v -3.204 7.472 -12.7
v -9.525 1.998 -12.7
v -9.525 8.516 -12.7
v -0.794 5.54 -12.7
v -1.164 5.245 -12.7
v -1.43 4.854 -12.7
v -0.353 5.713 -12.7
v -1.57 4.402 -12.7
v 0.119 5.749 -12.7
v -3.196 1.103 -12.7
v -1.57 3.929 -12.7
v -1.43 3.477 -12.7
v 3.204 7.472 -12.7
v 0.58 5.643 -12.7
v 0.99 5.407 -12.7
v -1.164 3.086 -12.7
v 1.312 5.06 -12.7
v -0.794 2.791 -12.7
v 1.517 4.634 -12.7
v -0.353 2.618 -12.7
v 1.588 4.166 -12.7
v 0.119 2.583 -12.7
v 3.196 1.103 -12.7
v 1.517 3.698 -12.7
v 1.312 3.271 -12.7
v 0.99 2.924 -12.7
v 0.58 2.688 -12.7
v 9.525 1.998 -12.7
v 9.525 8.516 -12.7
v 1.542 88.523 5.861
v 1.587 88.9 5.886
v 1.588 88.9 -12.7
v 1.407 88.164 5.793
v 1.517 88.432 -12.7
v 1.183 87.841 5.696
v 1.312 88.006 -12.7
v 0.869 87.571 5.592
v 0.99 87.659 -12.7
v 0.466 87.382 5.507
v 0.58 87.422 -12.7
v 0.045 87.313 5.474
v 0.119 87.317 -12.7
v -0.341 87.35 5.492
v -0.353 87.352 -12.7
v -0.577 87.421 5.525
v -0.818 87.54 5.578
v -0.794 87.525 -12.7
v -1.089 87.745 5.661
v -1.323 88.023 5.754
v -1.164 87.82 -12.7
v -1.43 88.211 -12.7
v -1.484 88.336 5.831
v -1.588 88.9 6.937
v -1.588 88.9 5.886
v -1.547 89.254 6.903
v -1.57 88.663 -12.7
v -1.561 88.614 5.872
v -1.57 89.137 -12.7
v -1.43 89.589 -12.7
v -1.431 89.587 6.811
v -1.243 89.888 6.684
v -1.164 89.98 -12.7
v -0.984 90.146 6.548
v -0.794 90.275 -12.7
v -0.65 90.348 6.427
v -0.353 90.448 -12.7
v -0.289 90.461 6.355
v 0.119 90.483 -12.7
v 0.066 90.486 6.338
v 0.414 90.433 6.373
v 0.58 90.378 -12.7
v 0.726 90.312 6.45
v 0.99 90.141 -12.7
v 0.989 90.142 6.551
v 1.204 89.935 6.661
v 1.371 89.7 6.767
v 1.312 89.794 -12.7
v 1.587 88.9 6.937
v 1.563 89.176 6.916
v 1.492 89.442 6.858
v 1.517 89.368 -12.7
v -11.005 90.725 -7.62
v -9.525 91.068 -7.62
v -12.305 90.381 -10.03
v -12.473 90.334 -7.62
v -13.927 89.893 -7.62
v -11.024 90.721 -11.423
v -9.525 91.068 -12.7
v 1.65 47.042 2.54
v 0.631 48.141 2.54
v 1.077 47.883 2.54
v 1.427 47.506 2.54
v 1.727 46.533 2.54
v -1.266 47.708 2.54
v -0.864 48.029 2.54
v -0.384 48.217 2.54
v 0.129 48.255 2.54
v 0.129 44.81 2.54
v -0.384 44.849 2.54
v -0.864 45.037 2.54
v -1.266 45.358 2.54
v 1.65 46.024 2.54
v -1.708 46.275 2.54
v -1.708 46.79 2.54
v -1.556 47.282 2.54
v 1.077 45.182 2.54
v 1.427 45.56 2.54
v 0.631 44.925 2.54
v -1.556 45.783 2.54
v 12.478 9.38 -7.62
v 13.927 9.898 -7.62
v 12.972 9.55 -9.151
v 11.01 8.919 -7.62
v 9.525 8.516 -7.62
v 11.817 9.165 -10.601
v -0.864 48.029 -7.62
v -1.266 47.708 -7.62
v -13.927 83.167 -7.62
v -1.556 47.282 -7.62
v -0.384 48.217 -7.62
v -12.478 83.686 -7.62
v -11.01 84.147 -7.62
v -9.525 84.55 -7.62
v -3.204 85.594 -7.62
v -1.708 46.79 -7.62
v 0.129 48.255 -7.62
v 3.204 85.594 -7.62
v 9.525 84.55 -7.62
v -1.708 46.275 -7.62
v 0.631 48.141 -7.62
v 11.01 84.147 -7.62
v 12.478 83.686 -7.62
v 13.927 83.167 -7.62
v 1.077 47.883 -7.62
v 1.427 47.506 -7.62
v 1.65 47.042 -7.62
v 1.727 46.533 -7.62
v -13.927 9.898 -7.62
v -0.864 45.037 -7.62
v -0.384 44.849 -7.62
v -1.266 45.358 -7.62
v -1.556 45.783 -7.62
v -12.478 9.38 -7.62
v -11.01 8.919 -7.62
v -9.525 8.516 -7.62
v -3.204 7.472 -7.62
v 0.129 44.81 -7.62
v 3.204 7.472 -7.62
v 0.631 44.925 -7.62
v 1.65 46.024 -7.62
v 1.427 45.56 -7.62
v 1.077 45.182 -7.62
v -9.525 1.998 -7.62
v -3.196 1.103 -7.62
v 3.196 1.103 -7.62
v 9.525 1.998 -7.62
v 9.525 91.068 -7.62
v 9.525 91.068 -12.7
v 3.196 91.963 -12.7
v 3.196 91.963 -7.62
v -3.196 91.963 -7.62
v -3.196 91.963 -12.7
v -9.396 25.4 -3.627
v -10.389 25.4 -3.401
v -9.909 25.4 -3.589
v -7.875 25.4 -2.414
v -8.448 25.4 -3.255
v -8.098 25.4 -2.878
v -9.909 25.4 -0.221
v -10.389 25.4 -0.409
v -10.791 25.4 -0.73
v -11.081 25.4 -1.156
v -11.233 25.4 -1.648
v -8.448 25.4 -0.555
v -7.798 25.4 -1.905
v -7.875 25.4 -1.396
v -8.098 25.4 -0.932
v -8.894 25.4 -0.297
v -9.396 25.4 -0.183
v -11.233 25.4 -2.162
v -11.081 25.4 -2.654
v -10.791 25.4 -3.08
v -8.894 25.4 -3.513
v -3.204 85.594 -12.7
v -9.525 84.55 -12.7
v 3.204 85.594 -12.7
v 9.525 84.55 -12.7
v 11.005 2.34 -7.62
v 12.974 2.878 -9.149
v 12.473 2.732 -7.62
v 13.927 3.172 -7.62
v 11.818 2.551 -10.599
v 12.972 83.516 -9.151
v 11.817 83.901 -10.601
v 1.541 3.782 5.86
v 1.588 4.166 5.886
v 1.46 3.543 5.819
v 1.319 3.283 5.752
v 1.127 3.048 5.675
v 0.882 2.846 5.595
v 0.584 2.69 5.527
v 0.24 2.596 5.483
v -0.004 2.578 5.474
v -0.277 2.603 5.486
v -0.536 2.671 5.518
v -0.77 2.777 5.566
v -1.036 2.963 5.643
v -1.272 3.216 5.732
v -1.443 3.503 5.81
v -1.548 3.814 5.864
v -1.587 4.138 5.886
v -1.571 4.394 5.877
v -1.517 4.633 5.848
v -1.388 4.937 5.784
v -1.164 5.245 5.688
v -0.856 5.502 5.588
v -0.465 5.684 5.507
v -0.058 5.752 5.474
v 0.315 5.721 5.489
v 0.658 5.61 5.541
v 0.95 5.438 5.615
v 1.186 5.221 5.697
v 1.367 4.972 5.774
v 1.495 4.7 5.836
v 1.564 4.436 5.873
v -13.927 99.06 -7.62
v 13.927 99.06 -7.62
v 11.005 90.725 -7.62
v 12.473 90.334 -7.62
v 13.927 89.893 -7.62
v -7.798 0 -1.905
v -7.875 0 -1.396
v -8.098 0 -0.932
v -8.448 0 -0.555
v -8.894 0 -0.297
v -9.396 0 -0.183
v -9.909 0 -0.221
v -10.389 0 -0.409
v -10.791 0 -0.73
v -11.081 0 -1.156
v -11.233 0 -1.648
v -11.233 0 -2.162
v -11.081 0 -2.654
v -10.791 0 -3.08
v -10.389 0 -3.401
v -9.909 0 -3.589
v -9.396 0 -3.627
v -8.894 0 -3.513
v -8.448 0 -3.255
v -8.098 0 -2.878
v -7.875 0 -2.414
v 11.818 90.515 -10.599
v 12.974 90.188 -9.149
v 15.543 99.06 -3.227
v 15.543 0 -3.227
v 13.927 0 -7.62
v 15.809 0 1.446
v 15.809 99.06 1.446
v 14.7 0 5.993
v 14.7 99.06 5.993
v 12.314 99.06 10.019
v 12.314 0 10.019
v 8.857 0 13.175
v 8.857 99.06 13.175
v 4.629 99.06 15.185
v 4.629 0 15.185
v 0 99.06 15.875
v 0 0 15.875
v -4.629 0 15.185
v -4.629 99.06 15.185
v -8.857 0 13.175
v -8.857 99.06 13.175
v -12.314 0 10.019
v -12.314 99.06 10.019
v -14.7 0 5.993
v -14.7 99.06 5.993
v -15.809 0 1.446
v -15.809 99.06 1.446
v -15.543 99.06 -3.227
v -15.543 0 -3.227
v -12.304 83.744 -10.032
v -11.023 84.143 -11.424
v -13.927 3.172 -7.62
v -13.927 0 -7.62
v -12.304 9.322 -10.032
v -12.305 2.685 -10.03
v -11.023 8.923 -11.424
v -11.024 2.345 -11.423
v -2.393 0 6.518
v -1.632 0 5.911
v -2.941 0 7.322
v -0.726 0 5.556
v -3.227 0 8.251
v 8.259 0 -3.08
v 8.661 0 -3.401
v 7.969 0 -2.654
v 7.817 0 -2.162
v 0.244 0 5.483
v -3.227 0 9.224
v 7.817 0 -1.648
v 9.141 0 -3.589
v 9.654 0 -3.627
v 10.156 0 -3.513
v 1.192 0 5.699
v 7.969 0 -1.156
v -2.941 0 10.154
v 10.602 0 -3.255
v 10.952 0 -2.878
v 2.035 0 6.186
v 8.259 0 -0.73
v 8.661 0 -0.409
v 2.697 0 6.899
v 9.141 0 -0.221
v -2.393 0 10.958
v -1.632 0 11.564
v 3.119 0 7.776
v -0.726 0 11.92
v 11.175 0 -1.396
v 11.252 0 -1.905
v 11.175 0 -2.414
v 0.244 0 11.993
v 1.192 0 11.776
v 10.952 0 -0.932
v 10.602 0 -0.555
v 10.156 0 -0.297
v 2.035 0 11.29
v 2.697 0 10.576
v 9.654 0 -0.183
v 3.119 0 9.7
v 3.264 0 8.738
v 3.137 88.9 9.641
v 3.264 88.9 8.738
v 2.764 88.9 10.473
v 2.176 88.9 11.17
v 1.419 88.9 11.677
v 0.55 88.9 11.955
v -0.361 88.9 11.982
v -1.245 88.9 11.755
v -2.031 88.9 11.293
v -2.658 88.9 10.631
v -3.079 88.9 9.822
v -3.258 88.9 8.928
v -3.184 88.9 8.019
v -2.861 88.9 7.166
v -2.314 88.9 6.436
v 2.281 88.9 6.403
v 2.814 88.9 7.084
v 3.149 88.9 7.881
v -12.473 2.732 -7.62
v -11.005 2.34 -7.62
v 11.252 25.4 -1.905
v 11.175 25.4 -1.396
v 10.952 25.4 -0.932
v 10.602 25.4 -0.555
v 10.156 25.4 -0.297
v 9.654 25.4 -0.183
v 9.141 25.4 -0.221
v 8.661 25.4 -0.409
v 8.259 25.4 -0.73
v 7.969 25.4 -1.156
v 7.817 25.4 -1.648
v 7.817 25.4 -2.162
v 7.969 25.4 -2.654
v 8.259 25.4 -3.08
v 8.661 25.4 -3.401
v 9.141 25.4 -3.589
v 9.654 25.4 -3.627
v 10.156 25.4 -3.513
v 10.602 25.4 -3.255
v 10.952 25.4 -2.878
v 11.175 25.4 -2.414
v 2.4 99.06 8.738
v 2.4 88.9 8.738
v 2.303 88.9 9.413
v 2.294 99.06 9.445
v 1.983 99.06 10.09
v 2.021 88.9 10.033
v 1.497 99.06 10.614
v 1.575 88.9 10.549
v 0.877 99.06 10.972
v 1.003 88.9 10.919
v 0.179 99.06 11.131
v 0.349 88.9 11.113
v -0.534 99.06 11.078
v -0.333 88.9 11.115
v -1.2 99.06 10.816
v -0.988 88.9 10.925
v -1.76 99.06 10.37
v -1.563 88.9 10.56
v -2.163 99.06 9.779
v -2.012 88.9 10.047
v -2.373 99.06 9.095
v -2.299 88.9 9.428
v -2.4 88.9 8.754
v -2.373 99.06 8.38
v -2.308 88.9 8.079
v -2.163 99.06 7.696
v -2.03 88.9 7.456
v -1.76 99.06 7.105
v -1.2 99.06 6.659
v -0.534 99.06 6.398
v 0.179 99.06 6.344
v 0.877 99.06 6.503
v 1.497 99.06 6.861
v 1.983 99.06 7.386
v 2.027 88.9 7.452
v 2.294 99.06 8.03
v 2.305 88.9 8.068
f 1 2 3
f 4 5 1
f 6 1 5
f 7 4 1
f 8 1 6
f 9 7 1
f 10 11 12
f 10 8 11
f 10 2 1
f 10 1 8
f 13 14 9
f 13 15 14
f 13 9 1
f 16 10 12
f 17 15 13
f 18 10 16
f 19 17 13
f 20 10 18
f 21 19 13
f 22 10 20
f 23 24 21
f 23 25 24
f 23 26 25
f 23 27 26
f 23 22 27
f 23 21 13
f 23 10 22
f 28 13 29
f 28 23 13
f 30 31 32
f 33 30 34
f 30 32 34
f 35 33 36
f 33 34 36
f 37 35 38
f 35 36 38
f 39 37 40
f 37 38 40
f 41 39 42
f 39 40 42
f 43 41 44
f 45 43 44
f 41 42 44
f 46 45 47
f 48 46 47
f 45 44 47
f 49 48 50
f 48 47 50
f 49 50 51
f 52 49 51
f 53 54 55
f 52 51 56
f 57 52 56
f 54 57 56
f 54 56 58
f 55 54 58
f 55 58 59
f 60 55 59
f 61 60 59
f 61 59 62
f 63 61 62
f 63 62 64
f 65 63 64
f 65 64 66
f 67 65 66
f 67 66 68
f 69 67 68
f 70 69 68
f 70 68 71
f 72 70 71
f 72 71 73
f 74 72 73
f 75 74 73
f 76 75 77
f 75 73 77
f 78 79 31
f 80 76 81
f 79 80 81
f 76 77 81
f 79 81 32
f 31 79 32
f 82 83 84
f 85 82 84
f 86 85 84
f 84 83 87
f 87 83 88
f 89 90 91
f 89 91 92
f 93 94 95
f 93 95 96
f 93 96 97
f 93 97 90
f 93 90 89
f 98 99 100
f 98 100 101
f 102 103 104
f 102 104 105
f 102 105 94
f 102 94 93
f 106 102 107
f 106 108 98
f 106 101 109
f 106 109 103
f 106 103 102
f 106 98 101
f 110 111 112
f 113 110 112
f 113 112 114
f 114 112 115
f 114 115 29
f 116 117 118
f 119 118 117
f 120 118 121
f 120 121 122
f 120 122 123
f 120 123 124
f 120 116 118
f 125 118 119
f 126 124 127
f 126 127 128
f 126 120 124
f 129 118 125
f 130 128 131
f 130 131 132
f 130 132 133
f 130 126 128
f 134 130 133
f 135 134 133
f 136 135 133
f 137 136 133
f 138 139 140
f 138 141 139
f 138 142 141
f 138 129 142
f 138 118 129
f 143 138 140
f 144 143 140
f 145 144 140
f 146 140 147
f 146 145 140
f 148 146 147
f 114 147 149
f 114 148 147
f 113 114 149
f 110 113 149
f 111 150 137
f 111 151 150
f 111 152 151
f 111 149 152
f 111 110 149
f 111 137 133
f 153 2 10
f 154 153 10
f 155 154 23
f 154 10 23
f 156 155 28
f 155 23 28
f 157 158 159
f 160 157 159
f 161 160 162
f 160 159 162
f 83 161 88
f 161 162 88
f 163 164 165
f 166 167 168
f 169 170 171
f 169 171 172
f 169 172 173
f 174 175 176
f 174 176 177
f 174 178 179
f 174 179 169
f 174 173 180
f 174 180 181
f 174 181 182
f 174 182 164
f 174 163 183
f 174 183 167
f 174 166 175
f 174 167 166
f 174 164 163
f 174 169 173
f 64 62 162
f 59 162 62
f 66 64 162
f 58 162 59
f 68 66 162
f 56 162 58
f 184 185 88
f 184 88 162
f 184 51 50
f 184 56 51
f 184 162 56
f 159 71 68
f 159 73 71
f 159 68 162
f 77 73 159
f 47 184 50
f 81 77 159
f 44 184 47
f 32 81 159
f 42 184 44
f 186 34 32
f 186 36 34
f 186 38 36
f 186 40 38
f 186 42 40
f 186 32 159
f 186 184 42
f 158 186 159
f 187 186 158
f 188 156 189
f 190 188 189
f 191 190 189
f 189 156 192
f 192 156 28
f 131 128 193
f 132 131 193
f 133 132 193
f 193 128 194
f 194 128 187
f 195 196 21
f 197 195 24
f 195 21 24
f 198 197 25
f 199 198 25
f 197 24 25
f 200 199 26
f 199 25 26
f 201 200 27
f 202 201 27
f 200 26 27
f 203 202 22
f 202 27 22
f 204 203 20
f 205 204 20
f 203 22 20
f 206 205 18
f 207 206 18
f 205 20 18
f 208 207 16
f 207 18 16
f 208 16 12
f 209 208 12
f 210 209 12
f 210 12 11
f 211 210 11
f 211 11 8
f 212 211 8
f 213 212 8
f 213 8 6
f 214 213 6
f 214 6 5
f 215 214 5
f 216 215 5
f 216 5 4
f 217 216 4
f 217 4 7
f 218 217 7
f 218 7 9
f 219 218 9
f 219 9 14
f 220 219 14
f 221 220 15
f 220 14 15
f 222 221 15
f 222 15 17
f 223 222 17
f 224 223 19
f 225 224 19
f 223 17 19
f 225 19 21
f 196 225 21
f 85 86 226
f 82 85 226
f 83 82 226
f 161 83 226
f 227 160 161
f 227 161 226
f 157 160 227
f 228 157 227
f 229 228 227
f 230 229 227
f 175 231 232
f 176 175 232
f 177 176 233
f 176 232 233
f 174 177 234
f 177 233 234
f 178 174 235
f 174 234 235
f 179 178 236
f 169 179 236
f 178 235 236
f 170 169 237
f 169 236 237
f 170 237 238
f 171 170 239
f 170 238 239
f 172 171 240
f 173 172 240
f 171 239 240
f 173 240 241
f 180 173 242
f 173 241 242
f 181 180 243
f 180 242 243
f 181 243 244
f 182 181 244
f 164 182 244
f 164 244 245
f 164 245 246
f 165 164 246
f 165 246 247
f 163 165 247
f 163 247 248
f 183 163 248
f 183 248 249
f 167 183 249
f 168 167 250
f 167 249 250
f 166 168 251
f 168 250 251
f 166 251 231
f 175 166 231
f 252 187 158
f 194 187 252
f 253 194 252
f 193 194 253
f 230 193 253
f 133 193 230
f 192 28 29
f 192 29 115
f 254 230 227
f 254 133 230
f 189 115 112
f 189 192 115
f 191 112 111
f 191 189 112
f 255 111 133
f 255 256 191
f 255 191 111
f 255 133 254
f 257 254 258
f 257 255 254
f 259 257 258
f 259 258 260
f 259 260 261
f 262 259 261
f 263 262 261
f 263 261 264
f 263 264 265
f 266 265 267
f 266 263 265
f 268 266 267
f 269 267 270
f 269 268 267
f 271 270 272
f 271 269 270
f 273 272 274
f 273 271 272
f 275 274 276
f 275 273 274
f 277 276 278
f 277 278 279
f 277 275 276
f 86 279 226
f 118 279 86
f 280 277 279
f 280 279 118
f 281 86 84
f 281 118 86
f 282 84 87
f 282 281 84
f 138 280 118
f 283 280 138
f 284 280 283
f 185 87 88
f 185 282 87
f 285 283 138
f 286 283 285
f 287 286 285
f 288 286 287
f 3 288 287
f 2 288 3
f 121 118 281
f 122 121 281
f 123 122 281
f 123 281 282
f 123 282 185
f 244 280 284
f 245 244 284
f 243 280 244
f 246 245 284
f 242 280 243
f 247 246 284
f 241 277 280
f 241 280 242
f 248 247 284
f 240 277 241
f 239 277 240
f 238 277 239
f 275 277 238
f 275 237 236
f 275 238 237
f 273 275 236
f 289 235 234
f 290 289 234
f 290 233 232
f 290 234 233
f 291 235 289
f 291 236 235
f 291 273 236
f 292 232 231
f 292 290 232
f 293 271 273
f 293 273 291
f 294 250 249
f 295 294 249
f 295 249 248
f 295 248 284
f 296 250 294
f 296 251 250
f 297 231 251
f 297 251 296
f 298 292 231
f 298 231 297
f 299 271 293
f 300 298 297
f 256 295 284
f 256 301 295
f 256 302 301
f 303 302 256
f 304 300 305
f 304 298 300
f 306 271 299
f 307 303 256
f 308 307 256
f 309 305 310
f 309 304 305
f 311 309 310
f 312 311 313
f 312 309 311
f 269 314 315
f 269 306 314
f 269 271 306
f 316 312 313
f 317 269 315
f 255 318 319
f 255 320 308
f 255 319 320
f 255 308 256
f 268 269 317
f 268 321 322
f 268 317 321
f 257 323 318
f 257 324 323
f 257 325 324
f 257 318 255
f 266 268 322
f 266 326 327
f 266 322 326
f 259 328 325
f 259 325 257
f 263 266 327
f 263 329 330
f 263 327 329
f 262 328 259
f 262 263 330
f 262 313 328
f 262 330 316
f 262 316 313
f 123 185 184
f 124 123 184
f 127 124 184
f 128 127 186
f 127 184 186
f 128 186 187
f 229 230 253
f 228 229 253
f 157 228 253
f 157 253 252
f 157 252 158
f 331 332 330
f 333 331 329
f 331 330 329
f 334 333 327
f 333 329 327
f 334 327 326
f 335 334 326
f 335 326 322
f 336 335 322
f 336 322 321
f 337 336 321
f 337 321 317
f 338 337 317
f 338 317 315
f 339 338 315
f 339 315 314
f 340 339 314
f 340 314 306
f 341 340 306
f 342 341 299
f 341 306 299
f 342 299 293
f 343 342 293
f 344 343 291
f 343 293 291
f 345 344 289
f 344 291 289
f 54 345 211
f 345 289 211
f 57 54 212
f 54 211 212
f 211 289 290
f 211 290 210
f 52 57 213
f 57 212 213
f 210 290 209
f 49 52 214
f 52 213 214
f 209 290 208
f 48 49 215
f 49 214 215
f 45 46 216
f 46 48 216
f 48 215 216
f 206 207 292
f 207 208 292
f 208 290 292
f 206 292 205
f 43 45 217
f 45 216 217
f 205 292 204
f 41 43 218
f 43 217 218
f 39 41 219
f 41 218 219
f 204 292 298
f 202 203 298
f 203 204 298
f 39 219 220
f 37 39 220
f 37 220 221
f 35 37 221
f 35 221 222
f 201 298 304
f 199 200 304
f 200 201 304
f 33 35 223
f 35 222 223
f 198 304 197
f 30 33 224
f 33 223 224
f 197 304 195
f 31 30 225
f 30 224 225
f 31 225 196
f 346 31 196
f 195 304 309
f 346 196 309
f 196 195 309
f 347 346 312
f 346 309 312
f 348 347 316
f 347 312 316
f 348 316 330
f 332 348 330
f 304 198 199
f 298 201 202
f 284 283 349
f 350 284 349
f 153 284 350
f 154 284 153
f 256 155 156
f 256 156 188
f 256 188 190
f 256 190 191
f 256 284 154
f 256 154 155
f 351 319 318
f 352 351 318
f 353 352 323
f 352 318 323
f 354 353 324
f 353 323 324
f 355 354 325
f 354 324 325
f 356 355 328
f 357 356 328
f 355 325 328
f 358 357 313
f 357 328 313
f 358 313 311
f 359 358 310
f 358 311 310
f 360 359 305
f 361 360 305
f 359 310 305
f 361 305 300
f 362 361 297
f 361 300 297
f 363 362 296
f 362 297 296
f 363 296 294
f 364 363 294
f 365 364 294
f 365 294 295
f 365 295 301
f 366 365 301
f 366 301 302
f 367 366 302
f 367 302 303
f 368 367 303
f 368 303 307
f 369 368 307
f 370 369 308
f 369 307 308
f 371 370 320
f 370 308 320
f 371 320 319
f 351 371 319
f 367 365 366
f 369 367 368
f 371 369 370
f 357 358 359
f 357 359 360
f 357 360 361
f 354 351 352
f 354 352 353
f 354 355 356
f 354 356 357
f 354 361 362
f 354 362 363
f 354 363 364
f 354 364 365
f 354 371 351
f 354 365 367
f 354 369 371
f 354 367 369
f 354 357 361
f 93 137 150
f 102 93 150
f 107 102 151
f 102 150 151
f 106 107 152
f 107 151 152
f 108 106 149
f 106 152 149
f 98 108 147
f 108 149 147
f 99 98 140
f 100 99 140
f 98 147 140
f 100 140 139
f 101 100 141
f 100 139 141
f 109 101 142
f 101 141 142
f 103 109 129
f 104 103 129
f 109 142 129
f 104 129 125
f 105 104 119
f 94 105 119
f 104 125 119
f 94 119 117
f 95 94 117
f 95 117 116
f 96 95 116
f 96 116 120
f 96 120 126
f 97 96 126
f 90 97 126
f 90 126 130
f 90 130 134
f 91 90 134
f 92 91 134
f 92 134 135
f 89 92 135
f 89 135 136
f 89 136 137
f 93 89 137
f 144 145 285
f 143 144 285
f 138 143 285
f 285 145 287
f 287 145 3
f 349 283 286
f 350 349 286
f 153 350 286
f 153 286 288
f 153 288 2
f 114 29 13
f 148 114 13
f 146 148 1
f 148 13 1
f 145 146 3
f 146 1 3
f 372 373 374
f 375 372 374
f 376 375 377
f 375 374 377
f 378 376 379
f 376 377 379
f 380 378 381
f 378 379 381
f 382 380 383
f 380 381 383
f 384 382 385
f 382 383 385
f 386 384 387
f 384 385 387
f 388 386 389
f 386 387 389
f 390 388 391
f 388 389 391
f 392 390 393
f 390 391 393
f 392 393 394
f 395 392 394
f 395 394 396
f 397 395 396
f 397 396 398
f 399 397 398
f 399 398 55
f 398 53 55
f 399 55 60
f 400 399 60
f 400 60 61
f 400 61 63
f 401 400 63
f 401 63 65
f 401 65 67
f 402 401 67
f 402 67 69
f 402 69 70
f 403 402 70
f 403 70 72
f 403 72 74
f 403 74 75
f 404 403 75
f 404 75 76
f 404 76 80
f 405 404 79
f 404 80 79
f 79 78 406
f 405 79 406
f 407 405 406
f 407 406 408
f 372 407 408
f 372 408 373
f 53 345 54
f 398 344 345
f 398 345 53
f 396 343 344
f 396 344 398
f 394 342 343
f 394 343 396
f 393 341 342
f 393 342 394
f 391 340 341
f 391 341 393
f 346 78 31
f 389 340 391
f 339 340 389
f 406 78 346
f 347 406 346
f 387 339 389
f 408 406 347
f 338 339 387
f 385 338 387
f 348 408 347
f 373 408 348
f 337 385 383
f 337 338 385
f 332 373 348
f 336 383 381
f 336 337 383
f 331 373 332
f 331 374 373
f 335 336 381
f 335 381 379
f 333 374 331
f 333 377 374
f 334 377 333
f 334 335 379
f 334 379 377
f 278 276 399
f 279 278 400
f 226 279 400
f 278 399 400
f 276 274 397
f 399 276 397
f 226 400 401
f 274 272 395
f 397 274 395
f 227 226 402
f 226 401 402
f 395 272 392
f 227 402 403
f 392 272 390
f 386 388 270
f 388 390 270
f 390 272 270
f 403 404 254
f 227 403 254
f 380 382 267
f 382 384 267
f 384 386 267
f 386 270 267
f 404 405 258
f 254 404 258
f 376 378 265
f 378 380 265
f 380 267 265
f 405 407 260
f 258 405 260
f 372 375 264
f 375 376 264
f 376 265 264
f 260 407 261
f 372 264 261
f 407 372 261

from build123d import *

# Parameters (mm, degrees)
F0_R     = 1.7272
F0_R_2   = 3.2639
F0_R_3   = 2.4003
F1_DEPTH = 99.06
F2_DEPTH = 88.9
F3_DEPTH = 25.4
F4_DEPTH = 99.061
F5_R     = 1.7272
F6_DEPTH = 5.08
F7_DEPTH = 15.24
F5_R_2   = 1.5875
F8_DEPTH = 19.6383854826


with BuildPart() as f1:
    # F0 (on Front) → F1 (new body)
    with BuildSketch(Plane.XZ):
        with BuildLine():
            Line((-9.525, -12.7), (9.525, -12.7))
            ThreePointArc((9.525, -12.7), (0, 15.875), (-9.525, -12.7))
        make_face()
        with Locations((-9.525, -1.905)):
            Circle(F0_R, mode=Mode.SUBTRACT)
        with Locations((9.525, -1.905)):
            Circle(F0_R, mode=Mode.SUBTRACT)
        with Locations((0, 8.7377419695)):
            Circle(F0_R_2, mode=Mode.SUBTRACT)
        with Locations((0, 8.7377419695)):
            Circle(F0_R_2)
        with Locations((0, 8.7377419695)):
            Circle(F0_R_3, mode=Mode.SUBTRACT)
        with Locations((-9.525, -1.905)):
            Circle(F0_R)
        with Locations((9.525, -1.905)):
            Circle(F0_R)
    extrude(amount=-F1_DEPTH)

    # F0 (on Front) → F2 (cut, through all)
    with BuildSketch(Plane.XZ):
        with Locations((0, 8.7377419695)):
            Circle(F0_R_2)
        with Locations((0, 8.7377419695)):
            Circle(F0_R_3, mode=Mode.SUBTRACT)
    extrude(amount=-F2_DEPTH, mode=Mode.SUBTRACT)

    # F0 (on Front) → F3 (cut)
    with BuildSketch(Plane.XZ):
        with Locations((-9.525, -1.905)):
            Circle(F0_R)
        with Locations((9.525, -1.905)):
            Circle(F0_R)
    extrude(amount=-F3_DEPTH, mode=Mode.SUBTRACT)

    # F0 (on Front) → F4 (cut, through all)
    with BuildSketch(Plane.XZ):
        with Locations((0, 8.7377419695)):
            Circle(F0_R_3)
    extrude(amount=-F4_DEPTH, mode=Mode.SUBTRACT)

    # F5 (on face) → F6 (cut)
    with BuildSketch(Plane(origin=(0, 0, -12.7), x_dir=(1, 0, 0), z_dir=(0, 0, -1))):
        with BuildLine():
            Line((-9.525, -84.5499397641), (-9.525, -8.5156602359))
            ThreePointArc((-9.525, -8.5156602359), (-17.1876576863, -11.3104638467), (-24.1058971733, -15.6307893484))
            Line((-24.1058971733, -15.6307893484), (-24.1058971733, -77.4348106516))
            ThreePointArc((-24.1058971733, -77.4348106516), (-17.1876576863, -81.7551361533), (-9.525, -84.5499397641))
        make_face()
        with BuildLine():
            Line((9.525, -84.5499397641), (9.525, -8.5156602359))
            ThreePointArc((9.525, -8.5156602359), (0, -7.3406), (-9.525, -8.5156602359))
            Line((-9.525, -8.5156602359), (-9.525, -84.5499397641))
            ThreePointArc((-9.525, -84.5499397641), (0, -85.725), (9.525, -84.5499397641))
        make_face()
        with Locations((0, -46.5328)):
            Circle(F5_R, mode=Mode.SUBTRACT)
        with BuildLine():
            ThreePointArc((19.2613247782, -12.4002655405), (14.5236243119, -10.1309748028), (9.525, -8.5156602359))
            Line((9.525, -8.5156602359), (9.525, -84.5499397641))
            ThreePointArc((9.525, -84.5499397641), (14.5236243119, -82.9346251972), (19.2613247782, -80.6653344595))
            Line((19.2613247782, -80.6653344595), (19.2613247782, -12.4002655405))
        make_face()
        with BuildLine():
            ThreePointArc((19.2613247782, -87.8013515693), (14.4855288925, -89.7098938525), (9.525, -91.067801469))
            Line((9.525, -91.067801469), (9.525, -99.06))
            Line((9.525, -99.06), (19.2613247782, -99.06))
            Line((19.2613247782, -99.06), (19.2613247782, -87.8013515693))
        make_face()
        with BuildLine():
            Line((9.525, -99.06), (9.525, -91.067801469))
            ThreePointArc((9.525, -91.067801469), (0, -92.075), (-9.525, -91.067801469))
            Line((-9.525, -91.067801469), (-9.525, -99.06))
            Line((-9.525, -99.06), (9.525, -99.06))
        make_face()
        with BuildLine():
            Line((-9.525, -99.06), (-9.525, -91.067801469))
            ThreePointArc((-9.525, -91.067801469), (-17.0718789618, -88.7541563206), (-24.1058971733, -85.1721284402))
            Line((-24.1058971733, -85.1721284402), (-24.1058971733, -99.06))
            Line((-24.1058971733, -99.06), (-9.525, -99.06))
        make_face()
        with BuildLine():
            Line((9.525, 0), (9.525, -1.997798531))
            ThreePointArc((9.525, -1.997798531), (14.4855288925, -3.3557061475), (19.2613247782, -5.2642484307))
            Line((19.2613247782, -5.2642484307), (19.2613247782, 0))
            Line((19.2613247782, 0), (9.525, 0))
        make_face()
        with BuildLine():
            ThreePointArc((-9.525, -1.997798531), (0, -0.9906), (9.525, -1.997798531))
            Line((9.525, -1.997798531), (9.525, 0))
            Line((9.525, 0), (-9.525, 0))
            Line((-9.525, 0), (-9.525, -1.997798531))
        make_face()
        with BuildLine():
            ThreePointArc((-24.1058971733, -7.8934715598), (-17.0718789618, -4.3114436794), (-9.525, -1.997798531))
            Line((-9.525, -1.997798531), (-9.525, 0))
            Line((-9.525, 0), (-24.1058971733, 0))
            Line((-24.1058971733, 0), (-24.1058971733, -7.8934715598))
        make_face()
    extrude(amount=-F6_DEPTH, mode=Mode.SUBTRACT)

    # F5 (on face) → F7 (cut)
    with BuildSketch(Plane(origin=(0, 0, -12.7), x_dir=(1, 0, 0), z_dir=(0, 0, -1))):
        with Locations((0, -46.5328)):
            Circle(F5_R)
    extrude(amount=-F7_DEPTH, mode=Mode.SUBTRACT)

    # F5 (on face) → F8 (cut, through all)
    with BuildSketch(Plane(origin=(0, 0, -12.7), x_dir=(1, 0, 0), z_dir=(0, 0, -1))):
        with Locations((0, -88.9)):
            Circle(F5_R_2)
        with Locations((0, -4.1656)):
            Circle(F5_R_2)
    extrude(amount=-F8_DEPTH, mode=Mode.SUBTRACT)


solid = f1.part
